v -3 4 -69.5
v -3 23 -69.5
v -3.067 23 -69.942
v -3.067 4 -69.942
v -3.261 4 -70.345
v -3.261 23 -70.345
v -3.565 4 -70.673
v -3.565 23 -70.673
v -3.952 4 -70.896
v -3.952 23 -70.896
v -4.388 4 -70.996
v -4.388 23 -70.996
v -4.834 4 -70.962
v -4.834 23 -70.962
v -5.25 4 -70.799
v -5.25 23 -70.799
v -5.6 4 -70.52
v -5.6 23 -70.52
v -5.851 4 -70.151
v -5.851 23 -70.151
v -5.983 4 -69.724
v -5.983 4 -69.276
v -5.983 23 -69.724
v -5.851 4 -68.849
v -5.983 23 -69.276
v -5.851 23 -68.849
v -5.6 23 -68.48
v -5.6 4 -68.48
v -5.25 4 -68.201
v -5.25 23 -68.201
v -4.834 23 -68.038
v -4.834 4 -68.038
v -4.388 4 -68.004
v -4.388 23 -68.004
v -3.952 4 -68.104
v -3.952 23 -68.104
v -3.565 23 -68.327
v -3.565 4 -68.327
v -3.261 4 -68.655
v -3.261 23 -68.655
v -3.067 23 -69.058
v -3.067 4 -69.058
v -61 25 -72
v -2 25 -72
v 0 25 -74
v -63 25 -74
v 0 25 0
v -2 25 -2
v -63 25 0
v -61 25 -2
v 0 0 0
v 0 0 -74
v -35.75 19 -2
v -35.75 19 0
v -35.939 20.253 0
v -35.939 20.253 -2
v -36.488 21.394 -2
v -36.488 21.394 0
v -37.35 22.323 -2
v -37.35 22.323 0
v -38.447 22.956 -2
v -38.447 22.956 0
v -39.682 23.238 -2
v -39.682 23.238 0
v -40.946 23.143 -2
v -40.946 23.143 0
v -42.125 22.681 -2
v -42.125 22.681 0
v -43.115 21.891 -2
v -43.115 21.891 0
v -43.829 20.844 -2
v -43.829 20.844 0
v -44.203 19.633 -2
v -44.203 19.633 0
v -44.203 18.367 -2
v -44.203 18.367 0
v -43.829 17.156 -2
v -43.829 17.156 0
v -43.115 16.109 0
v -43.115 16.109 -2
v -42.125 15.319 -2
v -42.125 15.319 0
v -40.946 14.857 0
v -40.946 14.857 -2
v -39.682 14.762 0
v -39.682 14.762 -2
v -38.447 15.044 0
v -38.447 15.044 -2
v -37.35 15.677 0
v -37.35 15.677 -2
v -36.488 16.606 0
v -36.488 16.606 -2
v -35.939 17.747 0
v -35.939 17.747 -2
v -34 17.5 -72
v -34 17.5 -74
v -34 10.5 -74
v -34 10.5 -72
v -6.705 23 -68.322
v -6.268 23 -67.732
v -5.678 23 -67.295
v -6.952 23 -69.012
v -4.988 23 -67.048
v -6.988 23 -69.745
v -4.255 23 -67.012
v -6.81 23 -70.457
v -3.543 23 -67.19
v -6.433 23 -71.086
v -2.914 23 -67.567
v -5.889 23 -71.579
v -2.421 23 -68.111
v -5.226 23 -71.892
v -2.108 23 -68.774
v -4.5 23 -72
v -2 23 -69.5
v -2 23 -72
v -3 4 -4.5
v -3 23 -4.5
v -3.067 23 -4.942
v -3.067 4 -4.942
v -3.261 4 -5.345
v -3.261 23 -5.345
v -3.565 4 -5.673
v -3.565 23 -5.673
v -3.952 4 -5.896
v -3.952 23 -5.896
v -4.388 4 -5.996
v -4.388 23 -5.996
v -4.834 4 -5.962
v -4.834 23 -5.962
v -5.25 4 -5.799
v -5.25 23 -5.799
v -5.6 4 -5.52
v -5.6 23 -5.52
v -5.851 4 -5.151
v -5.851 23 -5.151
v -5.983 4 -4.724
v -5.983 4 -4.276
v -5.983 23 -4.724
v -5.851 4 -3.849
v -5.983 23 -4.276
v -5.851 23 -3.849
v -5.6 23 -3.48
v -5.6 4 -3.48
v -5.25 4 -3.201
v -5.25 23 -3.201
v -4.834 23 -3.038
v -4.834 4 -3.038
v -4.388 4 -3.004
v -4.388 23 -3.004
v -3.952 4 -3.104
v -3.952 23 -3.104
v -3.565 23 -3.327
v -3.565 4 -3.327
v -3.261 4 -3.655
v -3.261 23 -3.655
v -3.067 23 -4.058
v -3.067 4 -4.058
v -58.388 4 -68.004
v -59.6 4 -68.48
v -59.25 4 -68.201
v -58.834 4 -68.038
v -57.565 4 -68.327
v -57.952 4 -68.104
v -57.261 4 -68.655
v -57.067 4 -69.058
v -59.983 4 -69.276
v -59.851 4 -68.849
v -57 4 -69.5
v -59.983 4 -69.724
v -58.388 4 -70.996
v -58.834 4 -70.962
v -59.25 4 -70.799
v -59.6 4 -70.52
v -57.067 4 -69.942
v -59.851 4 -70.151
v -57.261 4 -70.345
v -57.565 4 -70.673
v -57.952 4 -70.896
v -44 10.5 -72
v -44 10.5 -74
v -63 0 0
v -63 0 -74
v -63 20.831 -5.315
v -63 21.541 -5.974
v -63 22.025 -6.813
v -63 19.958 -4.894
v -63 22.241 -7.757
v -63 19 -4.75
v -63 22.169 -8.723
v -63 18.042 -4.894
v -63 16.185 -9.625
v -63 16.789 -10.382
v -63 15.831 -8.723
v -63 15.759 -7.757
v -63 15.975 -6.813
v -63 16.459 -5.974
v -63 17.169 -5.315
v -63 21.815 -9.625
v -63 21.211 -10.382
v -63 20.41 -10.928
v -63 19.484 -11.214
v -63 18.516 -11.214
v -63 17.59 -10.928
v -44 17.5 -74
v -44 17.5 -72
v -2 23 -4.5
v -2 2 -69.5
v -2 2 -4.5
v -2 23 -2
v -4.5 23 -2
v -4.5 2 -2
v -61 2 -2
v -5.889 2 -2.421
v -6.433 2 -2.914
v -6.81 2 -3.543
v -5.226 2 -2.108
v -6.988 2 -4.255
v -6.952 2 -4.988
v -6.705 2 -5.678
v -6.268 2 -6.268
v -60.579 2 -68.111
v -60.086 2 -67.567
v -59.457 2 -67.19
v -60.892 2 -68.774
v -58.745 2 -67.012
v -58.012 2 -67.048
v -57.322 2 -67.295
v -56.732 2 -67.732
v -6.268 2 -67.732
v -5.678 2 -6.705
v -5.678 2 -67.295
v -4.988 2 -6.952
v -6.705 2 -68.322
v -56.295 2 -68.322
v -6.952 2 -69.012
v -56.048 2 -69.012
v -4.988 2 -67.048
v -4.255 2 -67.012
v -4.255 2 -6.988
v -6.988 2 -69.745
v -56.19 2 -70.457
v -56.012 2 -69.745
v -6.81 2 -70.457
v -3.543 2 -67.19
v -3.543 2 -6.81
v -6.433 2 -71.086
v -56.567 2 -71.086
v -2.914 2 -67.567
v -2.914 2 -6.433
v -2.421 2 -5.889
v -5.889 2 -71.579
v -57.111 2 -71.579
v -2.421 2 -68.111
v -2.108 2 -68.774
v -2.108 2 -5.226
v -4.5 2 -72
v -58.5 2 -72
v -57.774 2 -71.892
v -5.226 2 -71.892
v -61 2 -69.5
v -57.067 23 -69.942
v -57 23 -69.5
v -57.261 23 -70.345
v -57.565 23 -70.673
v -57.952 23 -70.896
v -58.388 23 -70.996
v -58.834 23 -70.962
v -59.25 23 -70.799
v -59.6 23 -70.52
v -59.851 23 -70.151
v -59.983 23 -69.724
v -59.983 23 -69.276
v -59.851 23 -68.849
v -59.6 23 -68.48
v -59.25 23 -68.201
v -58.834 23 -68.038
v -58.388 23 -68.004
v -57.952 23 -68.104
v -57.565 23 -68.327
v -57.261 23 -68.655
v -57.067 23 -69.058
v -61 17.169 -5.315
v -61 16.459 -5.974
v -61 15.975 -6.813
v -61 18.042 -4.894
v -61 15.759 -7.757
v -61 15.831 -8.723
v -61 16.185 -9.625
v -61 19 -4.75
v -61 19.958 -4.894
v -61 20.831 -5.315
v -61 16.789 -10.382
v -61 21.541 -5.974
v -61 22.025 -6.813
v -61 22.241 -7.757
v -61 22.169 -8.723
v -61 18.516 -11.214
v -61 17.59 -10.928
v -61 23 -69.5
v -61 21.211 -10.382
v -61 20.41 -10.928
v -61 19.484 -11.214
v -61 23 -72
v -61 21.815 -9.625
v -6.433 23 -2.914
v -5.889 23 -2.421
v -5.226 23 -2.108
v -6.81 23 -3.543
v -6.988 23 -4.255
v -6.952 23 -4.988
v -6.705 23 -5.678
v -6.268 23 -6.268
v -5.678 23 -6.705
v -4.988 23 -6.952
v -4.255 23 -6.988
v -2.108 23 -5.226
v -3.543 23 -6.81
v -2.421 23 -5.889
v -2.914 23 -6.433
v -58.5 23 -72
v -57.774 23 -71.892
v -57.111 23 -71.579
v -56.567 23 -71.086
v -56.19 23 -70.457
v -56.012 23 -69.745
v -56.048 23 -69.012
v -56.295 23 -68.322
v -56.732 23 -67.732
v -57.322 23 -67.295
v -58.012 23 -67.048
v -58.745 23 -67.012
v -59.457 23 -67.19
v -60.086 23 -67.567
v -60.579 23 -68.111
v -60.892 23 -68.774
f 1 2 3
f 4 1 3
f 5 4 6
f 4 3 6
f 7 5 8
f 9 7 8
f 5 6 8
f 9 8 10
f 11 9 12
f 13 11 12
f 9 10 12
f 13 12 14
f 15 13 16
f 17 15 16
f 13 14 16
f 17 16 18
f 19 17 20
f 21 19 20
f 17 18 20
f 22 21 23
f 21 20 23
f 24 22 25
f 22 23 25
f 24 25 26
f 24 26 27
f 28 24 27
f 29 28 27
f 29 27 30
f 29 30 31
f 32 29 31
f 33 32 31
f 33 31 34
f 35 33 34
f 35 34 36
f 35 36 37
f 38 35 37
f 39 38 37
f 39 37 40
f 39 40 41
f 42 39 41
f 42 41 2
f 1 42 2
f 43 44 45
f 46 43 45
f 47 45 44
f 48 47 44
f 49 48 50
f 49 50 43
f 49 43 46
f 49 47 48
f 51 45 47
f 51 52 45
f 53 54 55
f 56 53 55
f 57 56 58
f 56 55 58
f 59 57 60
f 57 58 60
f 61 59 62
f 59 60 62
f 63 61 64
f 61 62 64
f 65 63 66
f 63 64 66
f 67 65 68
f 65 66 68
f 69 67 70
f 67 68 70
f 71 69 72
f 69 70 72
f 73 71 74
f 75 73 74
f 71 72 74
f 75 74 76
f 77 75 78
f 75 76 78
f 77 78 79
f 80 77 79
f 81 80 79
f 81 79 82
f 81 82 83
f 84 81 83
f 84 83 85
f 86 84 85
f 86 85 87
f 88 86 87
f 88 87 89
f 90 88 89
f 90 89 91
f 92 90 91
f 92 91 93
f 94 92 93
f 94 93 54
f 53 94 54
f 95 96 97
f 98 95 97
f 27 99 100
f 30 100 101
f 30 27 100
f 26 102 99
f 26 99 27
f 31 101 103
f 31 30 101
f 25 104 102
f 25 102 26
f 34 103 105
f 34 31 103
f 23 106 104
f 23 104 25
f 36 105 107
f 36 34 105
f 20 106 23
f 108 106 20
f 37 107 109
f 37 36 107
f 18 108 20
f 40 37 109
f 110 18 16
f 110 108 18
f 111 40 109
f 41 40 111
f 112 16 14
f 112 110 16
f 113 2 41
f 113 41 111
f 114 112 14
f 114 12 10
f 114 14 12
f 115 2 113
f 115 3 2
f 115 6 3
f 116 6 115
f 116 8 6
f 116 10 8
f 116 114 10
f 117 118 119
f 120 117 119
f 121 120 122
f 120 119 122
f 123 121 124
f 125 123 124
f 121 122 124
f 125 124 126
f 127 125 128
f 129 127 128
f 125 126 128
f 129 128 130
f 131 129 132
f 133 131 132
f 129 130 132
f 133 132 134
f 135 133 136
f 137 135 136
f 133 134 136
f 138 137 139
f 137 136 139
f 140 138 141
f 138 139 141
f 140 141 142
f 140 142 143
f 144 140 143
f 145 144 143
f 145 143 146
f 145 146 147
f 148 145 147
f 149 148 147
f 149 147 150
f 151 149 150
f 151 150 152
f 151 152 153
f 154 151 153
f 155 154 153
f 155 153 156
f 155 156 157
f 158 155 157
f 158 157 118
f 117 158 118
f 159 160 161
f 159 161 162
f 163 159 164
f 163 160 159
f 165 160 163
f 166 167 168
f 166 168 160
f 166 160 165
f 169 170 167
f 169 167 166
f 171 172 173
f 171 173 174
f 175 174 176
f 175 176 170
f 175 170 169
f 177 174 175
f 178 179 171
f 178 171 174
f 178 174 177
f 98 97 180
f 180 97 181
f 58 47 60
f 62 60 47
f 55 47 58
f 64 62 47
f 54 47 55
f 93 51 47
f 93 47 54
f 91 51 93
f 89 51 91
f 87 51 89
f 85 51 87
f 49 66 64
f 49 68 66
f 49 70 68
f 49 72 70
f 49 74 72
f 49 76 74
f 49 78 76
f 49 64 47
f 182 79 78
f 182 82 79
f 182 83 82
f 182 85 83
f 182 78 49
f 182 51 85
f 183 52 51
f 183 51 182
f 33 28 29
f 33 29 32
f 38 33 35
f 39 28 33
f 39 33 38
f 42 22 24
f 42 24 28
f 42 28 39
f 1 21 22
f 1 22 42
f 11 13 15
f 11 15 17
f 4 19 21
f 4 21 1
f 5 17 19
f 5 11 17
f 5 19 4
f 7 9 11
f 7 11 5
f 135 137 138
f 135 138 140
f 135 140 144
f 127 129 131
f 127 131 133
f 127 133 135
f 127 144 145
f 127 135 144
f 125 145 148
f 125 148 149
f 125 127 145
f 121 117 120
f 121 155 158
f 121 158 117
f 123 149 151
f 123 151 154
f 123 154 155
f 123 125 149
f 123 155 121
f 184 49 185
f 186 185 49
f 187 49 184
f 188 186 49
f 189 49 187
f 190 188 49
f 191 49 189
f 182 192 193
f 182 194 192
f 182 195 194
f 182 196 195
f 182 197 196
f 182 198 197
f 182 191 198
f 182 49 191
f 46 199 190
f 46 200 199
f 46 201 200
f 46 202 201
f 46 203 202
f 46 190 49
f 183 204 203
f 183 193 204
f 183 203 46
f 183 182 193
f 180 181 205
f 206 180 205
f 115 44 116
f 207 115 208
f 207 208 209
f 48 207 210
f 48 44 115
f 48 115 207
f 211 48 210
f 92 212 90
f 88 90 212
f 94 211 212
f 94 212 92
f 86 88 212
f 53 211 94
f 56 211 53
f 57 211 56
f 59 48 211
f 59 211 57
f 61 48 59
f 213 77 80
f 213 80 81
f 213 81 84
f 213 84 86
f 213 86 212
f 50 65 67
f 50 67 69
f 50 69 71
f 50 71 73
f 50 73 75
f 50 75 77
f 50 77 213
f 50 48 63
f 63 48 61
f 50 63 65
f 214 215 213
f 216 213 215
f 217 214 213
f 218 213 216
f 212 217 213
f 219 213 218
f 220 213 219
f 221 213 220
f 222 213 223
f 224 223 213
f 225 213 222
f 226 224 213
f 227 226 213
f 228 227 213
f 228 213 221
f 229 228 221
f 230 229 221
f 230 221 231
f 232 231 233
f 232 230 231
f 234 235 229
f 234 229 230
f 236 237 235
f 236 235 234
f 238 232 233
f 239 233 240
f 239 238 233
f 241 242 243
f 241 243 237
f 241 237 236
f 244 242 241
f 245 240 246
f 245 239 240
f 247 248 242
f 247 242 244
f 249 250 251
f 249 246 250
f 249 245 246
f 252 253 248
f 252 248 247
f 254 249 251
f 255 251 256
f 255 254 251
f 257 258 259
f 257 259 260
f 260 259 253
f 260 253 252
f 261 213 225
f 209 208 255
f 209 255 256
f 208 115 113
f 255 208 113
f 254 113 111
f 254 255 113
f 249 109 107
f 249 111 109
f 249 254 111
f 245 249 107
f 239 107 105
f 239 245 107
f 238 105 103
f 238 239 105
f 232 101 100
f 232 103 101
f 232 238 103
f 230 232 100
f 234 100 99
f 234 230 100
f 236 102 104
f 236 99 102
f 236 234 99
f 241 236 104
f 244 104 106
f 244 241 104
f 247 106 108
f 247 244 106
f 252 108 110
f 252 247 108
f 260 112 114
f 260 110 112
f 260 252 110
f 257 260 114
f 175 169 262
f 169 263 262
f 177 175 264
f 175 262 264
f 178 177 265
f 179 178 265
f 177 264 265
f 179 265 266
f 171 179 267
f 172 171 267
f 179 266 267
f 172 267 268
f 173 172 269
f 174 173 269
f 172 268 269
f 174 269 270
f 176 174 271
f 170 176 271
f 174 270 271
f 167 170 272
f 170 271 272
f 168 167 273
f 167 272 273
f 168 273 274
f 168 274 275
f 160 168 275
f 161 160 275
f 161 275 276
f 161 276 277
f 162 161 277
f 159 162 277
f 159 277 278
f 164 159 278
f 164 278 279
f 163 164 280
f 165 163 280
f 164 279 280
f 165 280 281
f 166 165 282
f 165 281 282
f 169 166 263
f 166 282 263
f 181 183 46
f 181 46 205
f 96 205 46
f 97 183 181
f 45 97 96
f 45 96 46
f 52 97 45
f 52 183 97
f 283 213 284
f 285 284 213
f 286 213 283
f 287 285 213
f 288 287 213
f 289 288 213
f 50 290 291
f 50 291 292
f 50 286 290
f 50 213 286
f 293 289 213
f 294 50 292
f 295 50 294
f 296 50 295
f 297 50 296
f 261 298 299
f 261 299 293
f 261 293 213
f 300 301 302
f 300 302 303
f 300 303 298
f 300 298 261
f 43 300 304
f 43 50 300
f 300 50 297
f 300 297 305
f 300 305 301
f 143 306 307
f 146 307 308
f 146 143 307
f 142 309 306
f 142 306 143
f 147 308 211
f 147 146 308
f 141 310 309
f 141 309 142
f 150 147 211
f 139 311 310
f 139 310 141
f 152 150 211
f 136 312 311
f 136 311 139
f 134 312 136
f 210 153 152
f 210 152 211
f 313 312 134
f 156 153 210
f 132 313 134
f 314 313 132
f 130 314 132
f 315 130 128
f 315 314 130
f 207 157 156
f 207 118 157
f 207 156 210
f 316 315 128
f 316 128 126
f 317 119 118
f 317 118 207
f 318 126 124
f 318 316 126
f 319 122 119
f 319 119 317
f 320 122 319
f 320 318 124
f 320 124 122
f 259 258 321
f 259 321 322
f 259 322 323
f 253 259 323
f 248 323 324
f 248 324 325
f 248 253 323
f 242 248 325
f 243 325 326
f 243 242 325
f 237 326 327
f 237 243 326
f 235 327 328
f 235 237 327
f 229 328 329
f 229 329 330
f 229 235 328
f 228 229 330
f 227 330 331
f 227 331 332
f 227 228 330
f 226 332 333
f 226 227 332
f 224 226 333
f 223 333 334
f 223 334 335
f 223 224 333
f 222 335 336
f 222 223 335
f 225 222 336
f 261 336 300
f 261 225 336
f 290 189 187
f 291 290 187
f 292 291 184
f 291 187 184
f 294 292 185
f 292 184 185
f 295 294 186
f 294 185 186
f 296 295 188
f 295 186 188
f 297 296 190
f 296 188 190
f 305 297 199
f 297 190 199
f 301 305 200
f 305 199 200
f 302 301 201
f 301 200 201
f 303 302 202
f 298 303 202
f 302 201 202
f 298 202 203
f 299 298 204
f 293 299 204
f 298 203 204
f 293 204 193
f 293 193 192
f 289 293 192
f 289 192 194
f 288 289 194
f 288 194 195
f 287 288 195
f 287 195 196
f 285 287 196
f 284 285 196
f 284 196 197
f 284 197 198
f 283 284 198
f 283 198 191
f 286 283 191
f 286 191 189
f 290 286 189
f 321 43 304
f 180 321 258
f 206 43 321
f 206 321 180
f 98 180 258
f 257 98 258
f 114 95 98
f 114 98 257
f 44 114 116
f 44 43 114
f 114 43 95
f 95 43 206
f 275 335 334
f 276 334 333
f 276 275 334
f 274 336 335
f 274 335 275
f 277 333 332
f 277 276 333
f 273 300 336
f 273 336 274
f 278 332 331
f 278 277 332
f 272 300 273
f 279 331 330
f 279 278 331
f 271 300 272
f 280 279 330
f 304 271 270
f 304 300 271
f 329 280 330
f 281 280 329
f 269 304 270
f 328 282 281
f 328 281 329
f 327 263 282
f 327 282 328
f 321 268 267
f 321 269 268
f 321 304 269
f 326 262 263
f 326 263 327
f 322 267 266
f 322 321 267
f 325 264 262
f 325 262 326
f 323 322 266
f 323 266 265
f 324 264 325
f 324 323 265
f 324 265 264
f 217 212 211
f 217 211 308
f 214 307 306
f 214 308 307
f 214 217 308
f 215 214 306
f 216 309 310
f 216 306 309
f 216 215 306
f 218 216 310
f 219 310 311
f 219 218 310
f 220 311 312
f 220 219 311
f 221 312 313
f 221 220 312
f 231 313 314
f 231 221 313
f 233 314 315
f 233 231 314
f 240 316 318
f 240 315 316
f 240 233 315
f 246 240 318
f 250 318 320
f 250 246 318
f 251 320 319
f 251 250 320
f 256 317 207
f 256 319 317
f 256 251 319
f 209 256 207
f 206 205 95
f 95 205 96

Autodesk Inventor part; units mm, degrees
ref_plane "YZ Plane" through (0, 0, 0) normal (1, 0, 0) x (0, 1, 0)
ref_plane "XZ Plane" through (0, 0, 0) normal (0, 1, 0) x (-1, 0, 0)
ref_plane "XY Plane" through (0, 0, 0) normal (0, 0, 1) x (1, 0, 0)
sketch "Sketch1" plane through (0, 0, 0) normal (0, 1, 0) x (-1, 0, 0)
  line L0 (0, 0) -> (63, 0)
  line L1 (63, 0) -> (63, -74)
  line L2 (63, -74) -> (0, -74)
  line L3 (0, -74) -> (0, 0)
  dimension "d0" = 63
  dimension "d1" = 74
extrude "Extrusion1" add sketch "Sketch1" along normal blind 25
sketch "Sketch2" plane through (0, 25, 0) normal (0, 1, 0) x (1, 0, 0)
  line L0 (-2, 2) -> (-61, 2)
  line L1 (-61, 2) -> (-61, 72)
  line L2 (-61, 72) -> (-2, 72)
  line L3 (-2, 72) -> (-2, 2)
  line L4 (-63, 74) -> (-63, 0) projected
  line L5 (-63, 0) -> (0, 0) projected
  line L6 (0, 0) -> (0, 74) projected
  dimension "d5" = 70
  dimension "d6" = 2
  dimension "d7" = 59
  dimension "d8" = 2
extrude "Extrusion2" cut sketch "Sketch2" against normal blind 23
sketch "Sketch3" plane through (0, 0, -74) normal (0, 0, -1) x (-1, 0, 0)
  line L0 (44, 17.5) -> (34, 17.5)
  line L1 (34, 17.5) -> (34, 10.5)
  line L2 (34, 10.5) -> (44, 10.5)
  line L3 (44, 10.5) -> (44, 17.5)
  line L4 (63, 0) -> (63, 25) projected
  line L5 (0, 25) -> (63, 25) projected
  point P0 (0, 0)
  dimension "d11" = 10
  dimension "d12" = 7
  dimension "d13" = 19
  dimension "d21" = 7.5
extrude "Extrusion3" cut sketch "Sketch3" against normal up to next
sketch "Sketch4" plane through (-63, 0, -74) normal (-1, 0, 0) x (0, 0, 1)
  circle A0 centre (66, 19) radius 3.25
  line L0 (74, 0) -> (74, 25) projected
  line L1 (0, 25) -> (74, 25) projected
  dimension "d16" = 6.5
  dimension "d17" = 8
  dimension "d18" = 6
extrude "Extrusion4" cut sketch "Sketch4" against normal up to next
sketch "Sketch5" plane through (-63, 0, 0) normal (0, 0, 1) x (1, 0, 0)
  circle A0 centre (23, 19) radius 4.25
  line L0 (29, 17.5) -> (29, 10.5) projected
  line L1 (0, 25) -> (63, 25) projected
  point P0 (63, 0)
  dimension "d22" = 8.5
  dimension "d23" = 6
  dimension "d24" = 6
extrude "Extrusion5" cut sketch "Sketch5" against normal up to next
sketch "Sketch6" plane through (0, 2, 0) normal (0, 1, 0) x (1, 0, 0)
  circle A0 centre (-4.5, 4.5) radius 2.5
  line L0 (0, 0) -> (0, 74) projected
  line L1 (-63, 0) -> (0, 0) projected
  circle A1 centre (-4.5, 69.5) radius 2.5
  line L2 (0, 74) -> (-63, 74) projected
  circle A2 centre (-58.5, 69.5) radius 2.5
  line L3 (-63, 74) -> (-63, 0) projected
  dimension "d27" = 5
  dimension "d28" = 4.5
  dimension "d29" = 4.5
  dimension "d30" = 5
  dimension "d31" = 4.5
  dimension "d32" = 5
  dimension "d33" = 4.5
extrude "Extrusion6" add sketch "Sketch6" along normal blind 21 contours A0 | A1 | A2
sketch "Sketch7" plane through (0, 23, 0) normal (0, 1, 0) x (1, 0, 0)
  arc A0 (-61, 69.5) -> (-58.5, 72) centre (-58.5, 69.5) ccw projected
  arc A1 (-4.5, 72) -> (-2, 69.5) centre (-4.5, 69.5) ccw projected
  arc A2 (-4.5, 72) -> (-2, 69.5) centre (-4.5, 69.5) ccw projected
  line L0 (-58.5, 72) -> (-4.5, 72) projected
  arc A3 (-61, 69.5) -> (-58.5, 72) centre (-58.5, 69.5) ccw projected
  line L1 (-61, 2) -> (-61, 69.5) projected
  line L2 (-4.5, 2) -> (-61, 2) projected
  arc A4 (-2, 4.5) -> (-4.5, 2) centre (-4.5, 4.5) ccw projected
  line L3 (-2, 69.5) -> (-2, 4.5) projected
  circle A5 centre (-4.5, 69.5) radius 1.5
  circle A6 centre (-58.5, 69.5) radius 1.5
  circle A7 centre (-4.5, 4.5) radius 1.5
  point P0 (0, 0)
  dimension "d36" = 3
  dimension "d37" = 3
  dimension "d38" = 3
extrude "Extrusion7" cut sketch "Sketch7" against normal blind 19 contours A5 | A6 | A7
sketch "Sketch8" plane through (0, 2, 0) normal (0, 1, 0) x (1, 0, 0)
  arc A0 (-4.5, 2) -> (-2, 4.5) centre (-4.5, 4.5) ccw projected
  line L0 (-4.5, 2) -> (-2, 2)
  line L1 (-2, 2) -> (-2, 4.5)
  line L2 (-2, 4.5) -> (-2, 4.1991)
  arc A1 (-4.5, 2) -> (-2, 4.5) centre (-4.5, 4.5) ccw
  arc A2 (-4.5, 72) -> (-2, 69.5) centre (-4.5, 69.5) ccw projected
  line L3 (-4.5, 72) -> (-2, 72)
  arc A3 (-2, 69.5) -> (-4.5, 72) centre (-4.5, 69.5) ccw projected
  line L4 (-2, 72) -> (-2, 69.5)
  arc A4 (-2, 69.5) -> (-4.5, 72) centre (-4.5, 69.5) ccw
  arc A5 (-58.5, 72) -> (-61, 69.5) centre (-58.5, 69.5) ccw projected
  arc A6 (-58.5, 72) -> (-61, 69.5) centre (-58.5, 69.5) ccw
  line L5 (-61, 69.5) -> (-61, 72)
  line L6 (-61, 72) -> (-58.5, 72)
  point P0 (0, 0)
extrude "Extrusion8" add sketch "Sketch8" along normal blind 21 contours A0 L1 L0 | L3 L4 A3 | A5 L5 L6
sketch "Sketch9" plane through (0, 25, 0) normal (0, 1, 0) x (1, 0, 0)
  point P0 (0, 0)
properties part number "bottom"
